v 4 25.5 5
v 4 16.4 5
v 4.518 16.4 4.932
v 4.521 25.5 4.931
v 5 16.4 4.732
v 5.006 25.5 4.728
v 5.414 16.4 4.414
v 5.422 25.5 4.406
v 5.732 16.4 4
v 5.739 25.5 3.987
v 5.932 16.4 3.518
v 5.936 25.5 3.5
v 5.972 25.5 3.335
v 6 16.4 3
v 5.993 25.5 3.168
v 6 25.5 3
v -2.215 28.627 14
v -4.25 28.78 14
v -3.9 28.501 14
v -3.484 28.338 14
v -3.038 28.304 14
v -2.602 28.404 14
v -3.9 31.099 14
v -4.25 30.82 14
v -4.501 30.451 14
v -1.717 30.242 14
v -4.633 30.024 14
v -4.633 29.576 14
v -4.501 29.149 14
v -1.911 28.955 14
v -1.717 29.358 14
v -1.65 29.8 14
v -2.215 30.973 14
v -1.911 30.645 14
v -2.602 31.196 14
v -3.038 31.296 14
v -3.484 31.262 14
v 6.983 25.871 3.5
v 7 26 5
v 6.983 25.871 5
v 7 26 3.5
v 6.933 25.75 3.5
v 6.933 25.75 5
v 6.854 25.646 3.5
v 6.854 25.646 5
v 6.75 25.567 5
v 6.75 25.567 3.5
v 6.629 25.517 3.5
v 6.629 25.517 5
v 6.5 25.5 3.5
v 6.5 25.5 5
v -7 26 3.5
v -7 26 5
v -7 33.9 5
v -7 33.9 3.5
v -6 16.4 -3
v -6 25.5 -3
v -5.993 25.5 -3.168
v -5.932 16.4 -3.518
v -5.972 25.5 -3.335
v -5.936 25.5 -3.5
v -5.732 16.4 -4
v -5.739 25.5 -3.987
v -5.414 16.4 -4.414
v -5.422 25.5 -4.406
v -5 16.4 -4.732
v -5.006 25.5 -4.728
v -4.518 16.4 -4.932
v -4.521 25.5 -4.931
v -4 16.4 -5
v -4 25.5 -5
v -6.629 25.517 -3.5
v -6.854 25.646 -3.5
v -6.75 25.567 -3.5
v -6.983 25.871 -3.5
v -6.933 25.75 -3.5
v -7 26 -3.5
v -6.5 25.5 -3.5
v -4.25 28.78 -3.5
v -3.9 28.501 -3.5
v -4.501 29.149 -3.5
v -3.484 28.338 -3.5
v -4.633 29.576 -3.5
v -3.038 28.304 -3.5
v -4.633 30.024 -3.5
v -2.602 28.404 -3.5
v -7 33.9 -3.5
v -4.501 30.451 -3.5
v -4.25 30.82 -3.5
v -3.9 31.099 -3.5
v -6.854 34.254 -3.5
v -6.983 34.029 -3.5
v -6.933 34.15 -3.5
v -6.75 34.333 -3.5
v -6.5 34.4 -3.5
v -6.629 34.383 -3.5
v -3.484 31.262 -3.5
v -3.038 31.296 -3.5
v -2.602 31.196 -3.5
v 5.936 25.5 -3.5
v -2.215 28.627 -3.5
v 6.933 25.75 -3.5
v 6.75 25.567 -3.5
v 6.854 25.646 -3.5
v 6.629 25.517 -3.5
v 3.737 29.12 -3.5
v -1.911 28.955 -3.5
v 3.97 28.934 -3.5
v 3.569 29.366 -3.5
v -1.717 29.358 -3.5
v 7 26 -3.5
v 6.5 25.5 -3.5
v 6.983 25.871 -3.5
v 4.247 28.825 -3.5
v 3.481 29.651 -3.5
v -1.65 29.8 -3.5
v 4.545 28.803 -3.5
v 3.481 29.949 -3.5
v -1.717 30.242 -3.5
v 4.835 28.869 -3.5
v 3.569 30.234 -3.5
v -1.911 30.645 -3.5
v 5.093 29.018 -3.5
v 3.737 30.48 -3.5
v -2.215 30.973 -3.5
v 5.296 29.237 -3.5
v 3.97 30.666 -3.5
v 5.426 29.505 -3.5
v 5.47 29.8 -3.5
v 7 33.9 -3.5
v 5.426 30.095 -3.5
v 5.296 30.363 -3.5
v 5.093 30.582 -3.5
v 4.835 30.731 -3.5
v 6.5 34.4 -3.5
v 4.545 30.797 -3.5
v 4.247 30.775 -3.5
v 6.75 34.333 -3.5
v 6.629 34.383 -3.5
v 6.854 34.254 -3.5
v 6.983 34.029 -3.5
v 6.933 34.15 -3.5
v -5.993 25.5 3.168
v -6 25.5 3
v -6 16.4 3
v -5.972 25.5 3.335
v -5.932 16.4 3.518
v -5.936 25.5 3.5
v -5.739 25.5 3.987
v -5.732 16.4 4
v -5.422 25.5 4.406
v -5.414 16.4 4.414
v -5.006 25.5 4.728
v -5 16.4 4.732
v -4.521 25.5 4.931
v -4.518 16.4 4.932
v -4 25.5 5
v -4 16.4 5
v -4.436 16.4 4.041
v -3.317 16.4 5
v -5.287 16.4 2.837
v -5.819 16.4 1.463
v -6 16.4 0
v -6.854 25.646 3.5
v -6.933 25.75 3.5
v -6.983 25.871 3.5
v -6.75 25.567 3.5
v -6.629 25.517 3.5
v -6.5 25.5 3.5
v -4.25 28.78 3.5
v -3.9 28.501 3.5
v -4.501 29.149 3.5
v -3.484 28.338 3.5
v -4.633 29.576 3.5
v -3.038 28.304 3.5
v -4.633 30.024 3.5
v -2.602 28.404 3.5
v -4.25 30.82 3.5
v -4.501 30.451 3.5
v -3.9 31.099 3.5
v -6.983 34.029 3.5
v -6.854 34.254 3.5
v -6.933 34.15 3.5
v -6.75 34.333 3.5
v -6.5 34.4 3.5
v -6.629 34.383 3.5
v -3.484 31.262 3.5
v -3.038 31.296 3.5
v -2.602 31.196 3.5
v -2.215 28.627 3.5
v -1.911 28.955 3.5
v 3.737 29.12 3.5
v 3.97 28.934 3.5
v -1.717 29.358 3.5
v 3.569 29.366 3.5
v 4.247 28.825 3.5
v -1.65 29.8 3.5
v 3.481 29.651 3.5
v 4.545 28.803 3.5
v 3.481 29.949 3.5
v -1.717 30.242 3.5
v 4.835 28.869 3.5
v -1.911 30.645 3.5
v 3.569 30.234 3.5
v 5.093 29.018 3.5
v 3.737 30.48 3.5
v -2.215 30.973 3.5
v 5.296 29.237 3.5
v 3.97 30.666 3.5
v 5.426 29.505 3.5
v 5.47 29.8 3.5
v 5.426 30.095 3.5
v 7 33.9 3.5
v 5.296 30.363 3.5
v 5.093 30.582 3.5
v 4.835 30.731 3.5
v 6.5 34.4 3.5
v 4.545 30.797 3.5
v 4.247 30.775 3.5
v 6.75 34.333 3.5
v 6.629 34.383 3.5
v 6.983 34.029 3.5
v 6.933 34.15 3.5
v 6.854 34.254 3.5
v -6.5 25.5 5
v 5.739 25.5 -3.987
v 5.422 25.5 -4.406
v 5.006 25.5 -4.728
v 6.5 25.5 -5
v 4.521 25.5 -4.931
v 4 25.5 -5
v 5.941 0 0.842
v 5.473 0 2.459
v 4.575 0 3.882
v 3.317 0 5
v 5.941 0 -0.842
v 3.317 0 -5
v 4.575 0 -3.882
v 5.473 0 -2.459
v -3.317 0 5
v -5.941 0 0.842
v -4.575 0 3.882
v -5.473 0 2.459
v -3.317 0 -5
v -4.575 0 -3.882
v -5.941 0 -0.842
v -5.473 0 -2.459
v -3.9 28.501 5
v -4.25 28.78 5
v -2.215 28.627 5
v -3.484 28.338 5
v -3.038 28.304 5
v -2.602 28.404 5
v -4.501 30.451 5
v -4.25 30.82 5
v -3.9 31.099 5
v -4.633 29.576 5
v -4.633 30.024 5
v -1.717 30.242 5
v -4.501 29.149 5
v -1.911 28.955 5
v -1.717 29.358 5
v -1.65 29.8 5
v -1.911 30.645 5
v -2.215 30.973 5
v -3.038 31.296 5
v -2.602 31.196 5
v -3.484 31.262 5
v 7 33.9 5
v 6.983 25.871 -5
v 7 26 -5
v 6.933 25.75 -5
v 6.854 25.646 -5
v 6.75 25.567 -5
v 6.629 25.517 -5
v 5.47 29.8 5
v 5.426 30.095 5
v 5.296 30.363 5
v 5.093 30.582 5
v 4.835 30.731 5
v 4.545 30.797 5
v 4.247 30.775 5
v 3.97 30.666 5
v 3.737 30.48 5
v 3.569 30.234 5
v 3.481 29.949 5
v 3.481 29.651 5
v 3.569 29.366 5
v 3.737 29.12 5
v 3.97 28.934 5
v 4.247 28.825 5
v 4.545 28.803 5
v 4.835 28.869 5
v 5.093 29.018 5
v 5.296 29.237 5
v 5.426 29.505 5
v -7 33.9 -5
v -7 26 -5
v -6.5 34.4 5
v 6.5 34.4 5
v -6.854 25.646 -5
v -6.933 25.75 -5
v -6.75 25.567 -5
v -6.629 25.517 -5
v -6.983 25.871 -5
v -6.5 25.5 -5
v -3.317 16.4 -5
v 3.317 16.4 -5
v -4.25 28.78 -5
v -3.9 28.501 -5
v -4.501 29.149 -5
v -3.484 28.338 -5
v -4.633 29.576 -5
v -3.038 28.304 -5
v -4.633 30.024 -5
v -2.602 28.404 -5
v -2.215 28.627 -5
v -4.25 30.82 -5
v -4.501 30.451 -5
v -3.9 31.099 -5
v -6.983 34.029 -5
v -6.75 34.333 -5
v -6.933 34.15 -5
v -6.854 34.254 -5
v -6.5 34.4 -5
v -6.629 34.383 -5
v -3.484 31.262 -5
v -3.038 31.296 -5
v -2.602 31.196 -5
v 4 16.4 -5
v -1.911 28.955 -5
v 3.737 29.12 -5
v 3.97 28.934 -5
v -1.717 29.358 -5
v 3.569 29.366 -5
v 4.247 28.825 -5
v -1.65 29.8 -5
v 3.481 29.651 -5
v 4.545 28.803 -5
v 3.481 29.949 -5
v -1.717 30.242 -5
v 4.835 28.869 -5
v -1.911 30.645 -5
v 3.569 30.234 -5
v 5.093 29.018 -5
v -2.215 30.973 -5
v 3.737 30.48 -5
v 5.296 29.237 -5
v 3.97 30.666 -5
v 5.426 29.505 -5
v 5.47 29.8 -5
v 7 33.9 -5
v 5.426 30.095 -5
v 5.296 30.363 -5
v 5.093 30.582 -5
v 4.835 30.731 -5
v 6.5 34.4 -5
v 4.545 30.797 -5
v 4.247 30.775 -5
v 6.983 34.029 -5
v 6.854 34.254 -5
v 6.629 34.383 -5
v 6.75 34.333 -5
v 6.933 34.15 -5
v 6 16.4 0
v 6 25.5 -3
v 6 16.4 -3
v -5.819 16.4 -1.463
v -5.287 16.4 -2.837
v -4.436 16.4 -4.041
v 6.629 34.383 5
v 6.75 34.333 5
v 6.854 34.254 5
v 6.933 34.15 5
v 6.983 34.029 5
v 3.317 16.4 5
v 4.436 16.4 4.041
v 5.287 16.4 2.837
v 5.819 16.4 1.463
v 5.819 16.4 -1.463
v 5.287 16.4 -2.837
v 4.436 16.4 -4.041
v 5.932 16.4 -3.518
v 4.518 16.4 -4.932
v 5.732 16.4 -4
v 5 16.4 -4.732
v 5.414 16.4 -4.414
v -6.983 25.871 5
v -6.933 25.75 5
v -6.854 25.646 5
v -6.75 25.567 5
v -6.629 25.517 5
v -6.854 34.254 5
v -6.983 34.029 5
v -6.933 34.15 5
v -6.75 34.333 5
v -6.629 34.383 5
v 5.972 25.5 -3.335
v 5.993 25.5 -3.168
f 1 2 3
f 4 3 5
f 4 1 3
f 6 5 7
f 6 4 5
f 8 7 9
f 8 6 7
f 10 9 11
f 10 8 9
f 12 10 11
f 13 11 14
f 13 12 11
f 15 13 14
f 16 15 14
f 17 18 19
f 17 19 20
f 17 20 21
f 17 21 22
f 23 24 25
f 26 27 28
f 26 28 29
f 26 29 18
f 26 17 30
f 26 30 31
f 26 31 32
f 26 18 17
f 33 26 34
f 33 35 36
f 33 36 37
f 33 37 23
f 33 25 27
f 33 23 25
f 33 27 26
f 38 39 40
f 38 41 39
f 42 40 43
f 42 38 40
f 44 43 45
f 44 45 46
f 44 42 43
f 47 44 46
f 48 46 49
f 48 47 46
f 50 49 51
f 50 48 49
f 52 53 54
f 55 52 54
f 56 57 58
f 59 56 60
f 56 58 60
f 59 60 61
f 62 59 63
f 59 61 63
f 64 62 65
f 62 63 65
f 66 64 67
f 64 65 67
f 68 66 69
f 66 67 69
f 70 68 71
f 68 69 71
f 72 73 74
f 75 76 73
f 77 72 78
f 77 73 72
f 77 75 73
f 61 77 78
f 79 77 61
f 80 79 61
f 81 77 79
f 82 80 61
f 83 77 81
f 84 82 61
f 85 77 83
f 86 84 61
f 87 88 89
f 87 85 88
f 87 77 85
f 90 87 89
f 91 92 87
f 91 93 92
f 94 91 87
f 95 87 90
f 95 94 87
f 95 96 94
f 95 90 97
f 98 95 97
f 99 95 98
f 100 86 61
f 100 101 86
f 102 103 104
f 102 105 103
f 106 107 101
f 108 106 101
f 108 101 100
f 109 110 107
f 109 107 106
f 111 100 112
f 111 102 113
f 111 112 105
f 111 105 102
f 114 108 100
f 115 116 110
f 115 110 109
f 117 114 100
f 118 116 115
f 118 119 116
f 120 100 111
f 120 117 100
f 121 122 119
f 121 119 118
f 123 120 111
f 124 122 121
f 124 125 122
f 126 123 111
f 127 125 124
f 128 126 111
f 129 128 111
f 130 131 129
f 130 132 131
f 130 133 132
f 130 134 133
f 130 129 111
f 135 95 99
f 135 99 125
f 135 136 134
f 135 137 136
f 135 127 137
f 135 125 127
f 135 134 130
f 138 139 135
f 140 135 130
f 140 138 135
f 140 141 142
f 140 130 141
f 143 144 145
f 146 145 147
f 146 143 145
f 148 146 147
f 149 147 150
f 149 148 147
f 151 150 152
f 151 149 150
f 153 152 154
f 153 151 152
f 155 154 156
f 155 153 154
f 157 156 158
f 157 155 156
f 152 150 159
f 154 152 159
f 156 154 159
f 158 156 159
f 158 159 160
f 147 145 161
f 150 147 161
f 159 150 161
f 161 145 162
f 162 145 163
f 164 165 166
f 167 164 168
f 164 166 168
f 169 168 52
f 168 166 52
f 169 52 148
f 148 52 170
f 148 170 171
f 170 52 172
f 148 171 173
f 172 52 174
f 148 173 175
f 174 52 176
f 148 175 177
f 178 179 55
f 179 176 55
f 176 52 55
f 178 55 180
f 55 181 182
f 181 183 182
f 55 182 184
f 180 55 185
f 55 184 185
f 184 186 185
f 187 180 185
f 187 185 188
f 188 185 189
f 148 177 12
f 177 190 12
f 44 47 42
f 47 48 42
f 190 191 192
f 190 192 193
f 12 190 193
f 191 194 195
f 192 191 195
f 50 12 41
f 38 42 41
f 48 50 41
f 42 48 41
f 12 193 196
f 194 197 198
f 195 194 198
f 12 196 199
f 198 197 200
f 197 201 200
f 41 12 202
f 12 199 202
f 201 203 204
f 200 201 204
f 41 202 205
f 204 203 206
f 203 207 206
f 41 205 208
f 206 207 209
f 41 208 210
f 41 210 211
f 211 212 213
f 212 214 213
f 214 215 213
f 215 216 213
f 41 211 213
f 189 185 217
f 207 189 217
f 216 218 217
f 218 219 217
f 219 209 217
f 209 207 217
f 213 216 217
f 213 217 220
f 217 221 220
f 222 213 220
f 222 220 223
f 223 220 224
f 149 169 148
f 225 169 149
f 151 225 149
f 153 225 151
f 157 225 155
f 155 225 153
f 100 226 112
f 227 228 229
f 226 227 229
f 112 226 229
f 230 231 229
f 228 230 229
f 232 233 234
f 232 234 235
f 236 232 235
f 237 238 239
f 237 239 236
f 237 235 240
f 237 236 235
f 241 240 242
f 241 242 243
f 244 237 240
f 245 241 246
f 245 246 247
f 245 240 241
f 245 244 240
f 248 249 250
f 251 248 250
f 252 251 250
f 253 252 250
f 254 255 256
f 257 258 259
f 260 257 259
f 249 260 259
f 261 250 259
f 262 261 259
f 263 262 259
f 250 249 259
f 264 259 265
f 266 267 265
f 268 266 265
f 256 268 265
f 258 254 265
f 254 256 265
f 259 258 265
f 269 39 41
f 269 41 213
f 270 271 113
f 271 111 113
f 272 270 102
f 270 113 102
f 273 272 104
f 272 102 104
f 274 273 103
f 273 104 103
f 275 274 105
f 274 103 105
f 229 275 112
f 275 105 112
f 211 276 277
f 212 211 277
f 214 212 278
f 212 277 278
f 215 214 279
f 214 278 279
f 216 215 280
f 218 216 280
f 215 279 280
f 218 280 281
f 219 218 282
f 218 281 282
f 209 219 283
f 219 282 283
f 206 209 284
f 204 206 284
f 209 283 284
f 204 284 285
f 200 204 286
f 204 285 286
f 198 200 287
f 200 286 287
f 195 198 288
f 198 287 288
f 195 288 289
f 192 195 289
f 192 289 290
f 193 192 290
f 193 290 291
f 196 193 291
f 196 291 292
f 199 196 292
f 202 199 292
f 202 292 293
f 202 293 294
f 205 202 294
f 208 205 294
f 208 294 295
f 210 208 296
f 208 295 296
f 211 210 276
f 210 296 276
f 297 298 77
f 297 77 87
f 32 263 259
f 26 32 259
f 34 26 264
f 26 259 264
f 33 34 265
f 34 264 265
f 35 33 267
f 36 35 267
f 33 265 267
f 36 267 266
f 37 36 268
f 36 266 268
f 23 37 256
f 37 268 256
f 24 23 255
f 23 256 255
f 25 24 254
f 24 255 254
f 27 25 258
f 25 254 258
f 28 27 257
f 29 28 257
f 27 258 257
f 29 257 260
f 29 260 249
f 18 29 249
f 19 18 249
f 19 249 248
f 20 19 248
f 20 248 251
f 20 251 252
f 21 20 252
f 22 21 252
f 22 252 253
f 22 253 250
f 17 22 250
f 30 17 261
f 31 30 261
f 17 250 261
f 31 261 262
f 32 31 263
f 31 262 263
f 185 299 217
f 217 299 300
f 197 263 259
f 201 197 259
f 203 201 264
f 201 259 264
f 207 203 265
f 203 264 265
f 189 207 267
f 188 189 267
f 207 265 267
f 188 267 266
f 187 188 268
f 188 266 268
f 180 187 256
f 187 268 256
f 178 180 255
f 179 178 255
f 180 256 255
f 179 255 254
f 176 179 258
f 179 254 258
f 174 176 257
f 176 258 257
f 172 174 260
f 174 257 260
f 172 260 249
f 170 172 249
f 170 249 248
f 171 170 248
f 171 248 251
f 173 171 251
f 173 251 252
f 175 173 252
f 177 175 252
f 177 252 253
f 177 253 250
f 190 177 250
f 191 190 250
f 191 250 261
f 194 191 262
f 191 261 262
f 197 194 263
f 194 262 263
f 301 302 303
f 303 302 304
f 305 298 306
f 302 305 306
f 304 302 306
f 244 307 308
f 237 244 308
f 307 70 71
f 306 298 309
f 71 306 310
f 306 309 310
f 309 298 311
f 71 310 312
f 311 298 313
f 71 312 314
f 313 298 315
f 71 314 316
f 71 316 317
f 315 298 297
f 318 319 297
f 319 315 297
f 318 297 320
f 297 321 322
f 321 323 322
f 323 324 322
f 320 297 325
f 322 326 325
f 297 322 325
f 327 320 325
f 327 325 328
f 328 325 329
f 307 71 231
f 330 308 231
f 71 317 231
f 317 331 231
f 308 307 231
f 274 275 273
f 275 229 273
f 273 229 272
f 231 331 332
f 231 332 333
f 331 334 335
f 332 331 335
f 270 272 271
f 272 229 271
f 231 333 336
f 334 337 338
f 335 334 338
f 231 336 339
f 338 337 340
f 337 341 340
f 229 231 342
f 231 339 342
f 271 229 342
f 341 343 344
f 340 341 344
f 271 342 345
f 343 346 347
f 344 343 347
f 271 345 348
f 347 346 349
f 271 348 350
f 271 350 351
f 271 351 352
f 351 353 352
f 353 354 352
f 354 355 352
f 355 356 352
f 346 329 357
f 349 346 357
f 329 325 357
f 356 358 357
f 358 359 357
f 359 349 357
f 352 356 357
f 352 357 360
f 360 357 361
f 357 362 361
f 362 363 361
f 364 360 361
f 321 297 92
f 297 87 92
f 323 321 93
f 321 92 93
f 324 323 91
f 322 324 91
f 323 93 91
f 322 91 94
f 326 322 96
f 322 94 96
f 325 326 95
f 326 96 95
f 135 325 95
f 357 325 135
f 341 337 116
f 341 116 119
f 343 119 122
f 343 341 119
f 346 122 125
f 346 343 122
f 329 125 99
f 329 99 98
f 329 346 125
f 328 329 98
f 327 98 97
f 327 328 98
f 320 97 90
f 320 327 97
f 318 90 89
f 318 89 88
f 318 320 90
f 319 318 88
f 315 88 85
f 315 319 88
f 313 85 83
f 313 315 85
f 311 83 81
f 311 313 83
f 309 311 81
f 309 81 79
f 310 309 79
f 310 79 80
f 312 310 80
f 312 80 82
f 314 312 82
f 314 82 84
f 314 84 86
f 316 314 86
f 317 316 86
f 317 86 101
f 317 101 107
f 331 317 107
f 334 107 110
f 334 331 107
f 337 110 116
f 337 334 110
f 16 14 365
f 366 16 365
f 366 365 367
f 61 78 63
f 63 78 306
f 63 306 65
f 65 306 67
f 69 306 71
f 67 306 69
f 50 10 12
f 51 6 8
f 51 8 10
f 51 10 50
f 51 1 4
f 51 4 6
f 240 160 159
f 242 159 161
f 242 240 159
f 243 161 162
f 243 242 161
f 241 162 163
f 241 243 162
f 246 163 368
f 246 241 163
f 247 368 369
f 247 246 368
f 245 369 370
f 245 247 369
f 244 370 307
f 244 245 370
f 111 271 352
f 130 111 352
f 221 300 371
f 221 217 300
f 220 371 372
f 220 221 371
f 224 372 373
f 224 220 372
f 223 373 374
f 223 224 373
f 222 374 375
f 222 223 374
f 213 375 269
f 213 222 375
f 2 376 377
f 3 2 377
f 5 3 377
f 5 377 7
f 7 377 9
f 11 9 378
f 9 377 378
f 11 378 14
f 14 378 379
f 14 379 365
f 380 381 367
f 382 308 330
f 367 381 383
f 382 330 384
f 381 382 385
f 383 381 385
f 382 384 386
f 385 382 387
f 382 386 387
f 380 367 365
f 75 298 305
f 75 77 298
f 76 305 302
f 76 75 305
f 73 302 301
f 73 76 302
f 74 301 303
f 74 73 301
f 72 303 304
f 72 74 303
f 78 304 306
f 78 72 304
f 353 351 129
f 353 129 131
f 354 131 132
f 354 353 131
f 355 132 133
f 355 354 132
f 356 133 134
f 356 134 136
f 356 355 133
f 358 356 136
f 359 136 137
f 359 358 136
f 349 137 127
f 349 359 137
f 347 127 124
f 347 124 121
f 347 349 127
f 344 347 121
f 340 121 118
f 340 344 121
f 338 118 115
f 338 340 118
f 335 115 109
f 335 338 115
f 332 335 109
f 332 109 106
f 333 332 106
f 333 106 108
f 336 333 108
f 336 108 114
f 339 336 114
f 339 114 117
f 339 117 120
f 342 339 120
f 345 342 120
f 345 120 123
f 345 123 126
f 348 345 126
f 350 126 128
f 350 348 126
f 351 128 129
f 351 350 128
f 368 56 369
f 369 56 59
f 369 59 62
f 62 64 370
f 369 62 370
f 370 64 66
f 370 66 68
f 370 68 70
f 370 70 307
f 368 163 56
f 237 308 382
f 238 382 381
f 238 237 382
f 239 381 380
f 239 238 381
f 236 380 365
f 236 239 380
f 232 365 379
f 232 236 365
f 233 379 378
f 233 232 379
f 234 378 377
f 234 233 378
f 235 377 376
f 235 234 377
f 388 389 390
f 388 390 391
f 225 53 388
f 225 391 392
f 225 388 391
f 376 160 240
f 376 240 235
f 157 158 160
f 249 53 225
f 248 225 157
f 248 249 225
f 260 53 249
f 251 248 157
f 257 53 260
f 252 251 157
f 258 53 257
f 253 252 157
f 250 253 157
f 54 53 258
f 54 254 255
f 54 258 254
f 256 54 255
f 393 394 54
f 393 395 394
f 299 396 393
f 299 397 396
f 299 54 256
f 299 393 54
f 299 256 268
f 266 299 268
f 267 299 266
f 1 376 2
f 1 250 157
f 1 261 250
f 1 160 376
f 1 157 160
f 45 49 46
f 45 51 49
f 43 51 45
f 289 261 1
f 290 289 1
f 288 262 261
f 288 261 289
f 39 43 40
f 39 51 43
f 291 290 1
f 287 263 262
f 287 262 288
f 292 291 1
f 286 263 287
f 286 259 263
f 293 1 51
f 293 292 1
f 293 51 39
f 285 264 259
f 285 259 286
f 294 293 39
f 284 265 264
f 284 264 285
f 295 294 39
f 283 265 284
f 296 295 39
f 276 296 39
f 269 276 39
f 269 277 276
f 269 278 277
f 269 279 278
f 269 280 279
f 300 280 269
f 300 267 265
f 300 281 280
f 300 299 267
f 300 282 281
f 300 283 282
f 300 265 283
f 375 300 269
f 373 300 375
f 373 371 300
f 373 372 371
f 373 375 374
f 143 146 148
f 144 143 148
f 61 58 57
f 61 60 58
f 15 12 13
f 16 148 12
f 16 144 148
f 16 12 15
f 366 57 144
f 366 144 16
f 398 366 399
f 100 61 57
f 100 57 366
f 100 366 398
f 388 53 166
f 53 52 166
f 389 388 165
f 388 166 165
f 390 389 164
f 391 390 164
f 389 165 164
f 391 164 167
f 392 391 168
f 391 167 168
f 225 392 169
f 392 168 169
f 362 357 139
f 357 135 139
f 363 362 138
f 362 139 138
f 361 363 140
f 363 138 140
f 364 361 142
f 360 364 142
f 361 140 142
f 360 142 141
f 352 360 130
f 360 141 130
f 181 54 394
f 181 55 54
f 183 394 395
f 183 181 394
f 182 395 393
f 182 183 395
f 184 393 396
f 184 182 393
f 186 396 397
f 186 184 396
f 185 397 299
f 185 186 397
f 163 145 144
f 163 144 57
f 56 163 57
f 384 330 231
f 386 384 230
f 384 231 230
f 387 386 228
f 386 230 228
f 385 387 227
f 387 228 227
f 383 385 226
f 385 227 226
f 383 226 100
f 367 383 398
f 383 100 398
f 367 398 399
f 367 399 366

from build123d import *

# Parameters (mm, degrees)
BOSS_EXTRUDE1_DEPTH  = 16.4
SKETCH2_W            = 12
SKETCH2_H            = 10
BOSS_EXTRUDE2_DEPTH  = 9.1
FILLET1_R            = 2
SKETCH3_W            = 14
SKETCH3_H            = 8.9
SKETCH3_R            = 1.5
SKETCH3_R_2          = 1
BOSS_EXTRUDE3_DEPTH  = 1.5
FILLET2_R            = 0.5
FILLET2_OF_MIRROR1_R = 0.5
SKETCH4_R            = 1.5
BOSS_EXTRUDE4_DEPTH  = 9


with BuildPart() as part:
    # Sketch1 → Boss-Extrude1 (new body)
    with BuildSketch(Plane(origin=(0, 0, 0), x_dir=(1, 0, 0), z_dir=(0, 1, 0))):
        with BuildLine():
            Line((-3.31662479, 5), (3.31662479, 5))
            ThreePointArc((3.31662479, 5), (6, 0), (3.31662479, -5))
            Line((3.31662479, -5), (-3.31662479, -5))
            ThreePointArc((-3.31662479, -5), (-6, 0), (-3.31662479, 5))
        make_face()
    extrude(amount=BOSS_EXTRUDE1_DEPTH)

    # Sketch2 → Boss-Extrude2 (add)
    with BuildSketch(Plane(origin=(0, 16.4, 0), x_dir=(1, 0, 0), z_dir=(0, 1, 0))):
        Rectangle(SKETCH2_W, SKETCH2_H)
    extrude(amount=BOSS_EXTRUDE2_DEPTH)

    # Fillet1
    fillet1_edges = [part.edges().sort_by_distance(p)[0] for p in [
        (-6, 20.95, -5),
        (-6, 20.95, 5),
        (6, 20.95, 5),
        (6, 20.95, -5),
    ]]
    fillet(fillet1_edges, radius=FILLET1_R)

    # Sketch3 → Boss-Extrude3 (add)
    with BuildSketch(Plane.XY.offset(5)):
        with Locations((0, 29.95)):
            Rectangle(SKETCH3_W, SKETCH3_H)
        with Locations((-3.15, 29.8)):
            Circle(SKETCH3_R, mode=Mode.SUBTRACT)
        with Locations((4.47, 29.8)):
            Circle(SKETCH3_R_2, mode=Mode.SUBTRACT)
    boss_extrude3 = extrude(amount=-BOSS_EXTRUDE3_DEPTH)

    # Fillet2
    fillet2_edges = [part.edges().sort_by_distance(p)[0] for p in [
        (-7, 25.5, 4.25),
        (-7, 34.4, 4.25),
        (7, 34.4, 4.25),
        (7, 25.5, 4.25),
    ]]
    fillet(fillet2_edges, radius=FILLET2_R)

    # Mirror1: Boss-Extrude3 across plane
    add(boss_extrude3.mirror(Plane.XY))

    # Fillet2 of Mirror1
    fillet2_of_mirror1_edges = [part.edges().sort_by_distance(p)[0] for p in [
        (-7, 25.5, -4.25),
        (-7, 34.4, -4.25),
        (7, 34.4, -4.25),
        (7, 25.5, -4.25),
    ]]
    fillet(fillet2_of_mirror1_edges, radius=FILLET2_OF_MIRROR1_R)


with BuildPart() as body_2:
    # Sketch4 → Boss-Extrude4 (new body)
    with BuildSketch(Plane.XY.offset(5)):
        with Locations((-3.15, 29.8)):
            Circle(SKETCH4_R)
    extrude(amount=BOSS_EXTRUDE4_DEPTH)


solid = Compound([part.part, body_2.part])
